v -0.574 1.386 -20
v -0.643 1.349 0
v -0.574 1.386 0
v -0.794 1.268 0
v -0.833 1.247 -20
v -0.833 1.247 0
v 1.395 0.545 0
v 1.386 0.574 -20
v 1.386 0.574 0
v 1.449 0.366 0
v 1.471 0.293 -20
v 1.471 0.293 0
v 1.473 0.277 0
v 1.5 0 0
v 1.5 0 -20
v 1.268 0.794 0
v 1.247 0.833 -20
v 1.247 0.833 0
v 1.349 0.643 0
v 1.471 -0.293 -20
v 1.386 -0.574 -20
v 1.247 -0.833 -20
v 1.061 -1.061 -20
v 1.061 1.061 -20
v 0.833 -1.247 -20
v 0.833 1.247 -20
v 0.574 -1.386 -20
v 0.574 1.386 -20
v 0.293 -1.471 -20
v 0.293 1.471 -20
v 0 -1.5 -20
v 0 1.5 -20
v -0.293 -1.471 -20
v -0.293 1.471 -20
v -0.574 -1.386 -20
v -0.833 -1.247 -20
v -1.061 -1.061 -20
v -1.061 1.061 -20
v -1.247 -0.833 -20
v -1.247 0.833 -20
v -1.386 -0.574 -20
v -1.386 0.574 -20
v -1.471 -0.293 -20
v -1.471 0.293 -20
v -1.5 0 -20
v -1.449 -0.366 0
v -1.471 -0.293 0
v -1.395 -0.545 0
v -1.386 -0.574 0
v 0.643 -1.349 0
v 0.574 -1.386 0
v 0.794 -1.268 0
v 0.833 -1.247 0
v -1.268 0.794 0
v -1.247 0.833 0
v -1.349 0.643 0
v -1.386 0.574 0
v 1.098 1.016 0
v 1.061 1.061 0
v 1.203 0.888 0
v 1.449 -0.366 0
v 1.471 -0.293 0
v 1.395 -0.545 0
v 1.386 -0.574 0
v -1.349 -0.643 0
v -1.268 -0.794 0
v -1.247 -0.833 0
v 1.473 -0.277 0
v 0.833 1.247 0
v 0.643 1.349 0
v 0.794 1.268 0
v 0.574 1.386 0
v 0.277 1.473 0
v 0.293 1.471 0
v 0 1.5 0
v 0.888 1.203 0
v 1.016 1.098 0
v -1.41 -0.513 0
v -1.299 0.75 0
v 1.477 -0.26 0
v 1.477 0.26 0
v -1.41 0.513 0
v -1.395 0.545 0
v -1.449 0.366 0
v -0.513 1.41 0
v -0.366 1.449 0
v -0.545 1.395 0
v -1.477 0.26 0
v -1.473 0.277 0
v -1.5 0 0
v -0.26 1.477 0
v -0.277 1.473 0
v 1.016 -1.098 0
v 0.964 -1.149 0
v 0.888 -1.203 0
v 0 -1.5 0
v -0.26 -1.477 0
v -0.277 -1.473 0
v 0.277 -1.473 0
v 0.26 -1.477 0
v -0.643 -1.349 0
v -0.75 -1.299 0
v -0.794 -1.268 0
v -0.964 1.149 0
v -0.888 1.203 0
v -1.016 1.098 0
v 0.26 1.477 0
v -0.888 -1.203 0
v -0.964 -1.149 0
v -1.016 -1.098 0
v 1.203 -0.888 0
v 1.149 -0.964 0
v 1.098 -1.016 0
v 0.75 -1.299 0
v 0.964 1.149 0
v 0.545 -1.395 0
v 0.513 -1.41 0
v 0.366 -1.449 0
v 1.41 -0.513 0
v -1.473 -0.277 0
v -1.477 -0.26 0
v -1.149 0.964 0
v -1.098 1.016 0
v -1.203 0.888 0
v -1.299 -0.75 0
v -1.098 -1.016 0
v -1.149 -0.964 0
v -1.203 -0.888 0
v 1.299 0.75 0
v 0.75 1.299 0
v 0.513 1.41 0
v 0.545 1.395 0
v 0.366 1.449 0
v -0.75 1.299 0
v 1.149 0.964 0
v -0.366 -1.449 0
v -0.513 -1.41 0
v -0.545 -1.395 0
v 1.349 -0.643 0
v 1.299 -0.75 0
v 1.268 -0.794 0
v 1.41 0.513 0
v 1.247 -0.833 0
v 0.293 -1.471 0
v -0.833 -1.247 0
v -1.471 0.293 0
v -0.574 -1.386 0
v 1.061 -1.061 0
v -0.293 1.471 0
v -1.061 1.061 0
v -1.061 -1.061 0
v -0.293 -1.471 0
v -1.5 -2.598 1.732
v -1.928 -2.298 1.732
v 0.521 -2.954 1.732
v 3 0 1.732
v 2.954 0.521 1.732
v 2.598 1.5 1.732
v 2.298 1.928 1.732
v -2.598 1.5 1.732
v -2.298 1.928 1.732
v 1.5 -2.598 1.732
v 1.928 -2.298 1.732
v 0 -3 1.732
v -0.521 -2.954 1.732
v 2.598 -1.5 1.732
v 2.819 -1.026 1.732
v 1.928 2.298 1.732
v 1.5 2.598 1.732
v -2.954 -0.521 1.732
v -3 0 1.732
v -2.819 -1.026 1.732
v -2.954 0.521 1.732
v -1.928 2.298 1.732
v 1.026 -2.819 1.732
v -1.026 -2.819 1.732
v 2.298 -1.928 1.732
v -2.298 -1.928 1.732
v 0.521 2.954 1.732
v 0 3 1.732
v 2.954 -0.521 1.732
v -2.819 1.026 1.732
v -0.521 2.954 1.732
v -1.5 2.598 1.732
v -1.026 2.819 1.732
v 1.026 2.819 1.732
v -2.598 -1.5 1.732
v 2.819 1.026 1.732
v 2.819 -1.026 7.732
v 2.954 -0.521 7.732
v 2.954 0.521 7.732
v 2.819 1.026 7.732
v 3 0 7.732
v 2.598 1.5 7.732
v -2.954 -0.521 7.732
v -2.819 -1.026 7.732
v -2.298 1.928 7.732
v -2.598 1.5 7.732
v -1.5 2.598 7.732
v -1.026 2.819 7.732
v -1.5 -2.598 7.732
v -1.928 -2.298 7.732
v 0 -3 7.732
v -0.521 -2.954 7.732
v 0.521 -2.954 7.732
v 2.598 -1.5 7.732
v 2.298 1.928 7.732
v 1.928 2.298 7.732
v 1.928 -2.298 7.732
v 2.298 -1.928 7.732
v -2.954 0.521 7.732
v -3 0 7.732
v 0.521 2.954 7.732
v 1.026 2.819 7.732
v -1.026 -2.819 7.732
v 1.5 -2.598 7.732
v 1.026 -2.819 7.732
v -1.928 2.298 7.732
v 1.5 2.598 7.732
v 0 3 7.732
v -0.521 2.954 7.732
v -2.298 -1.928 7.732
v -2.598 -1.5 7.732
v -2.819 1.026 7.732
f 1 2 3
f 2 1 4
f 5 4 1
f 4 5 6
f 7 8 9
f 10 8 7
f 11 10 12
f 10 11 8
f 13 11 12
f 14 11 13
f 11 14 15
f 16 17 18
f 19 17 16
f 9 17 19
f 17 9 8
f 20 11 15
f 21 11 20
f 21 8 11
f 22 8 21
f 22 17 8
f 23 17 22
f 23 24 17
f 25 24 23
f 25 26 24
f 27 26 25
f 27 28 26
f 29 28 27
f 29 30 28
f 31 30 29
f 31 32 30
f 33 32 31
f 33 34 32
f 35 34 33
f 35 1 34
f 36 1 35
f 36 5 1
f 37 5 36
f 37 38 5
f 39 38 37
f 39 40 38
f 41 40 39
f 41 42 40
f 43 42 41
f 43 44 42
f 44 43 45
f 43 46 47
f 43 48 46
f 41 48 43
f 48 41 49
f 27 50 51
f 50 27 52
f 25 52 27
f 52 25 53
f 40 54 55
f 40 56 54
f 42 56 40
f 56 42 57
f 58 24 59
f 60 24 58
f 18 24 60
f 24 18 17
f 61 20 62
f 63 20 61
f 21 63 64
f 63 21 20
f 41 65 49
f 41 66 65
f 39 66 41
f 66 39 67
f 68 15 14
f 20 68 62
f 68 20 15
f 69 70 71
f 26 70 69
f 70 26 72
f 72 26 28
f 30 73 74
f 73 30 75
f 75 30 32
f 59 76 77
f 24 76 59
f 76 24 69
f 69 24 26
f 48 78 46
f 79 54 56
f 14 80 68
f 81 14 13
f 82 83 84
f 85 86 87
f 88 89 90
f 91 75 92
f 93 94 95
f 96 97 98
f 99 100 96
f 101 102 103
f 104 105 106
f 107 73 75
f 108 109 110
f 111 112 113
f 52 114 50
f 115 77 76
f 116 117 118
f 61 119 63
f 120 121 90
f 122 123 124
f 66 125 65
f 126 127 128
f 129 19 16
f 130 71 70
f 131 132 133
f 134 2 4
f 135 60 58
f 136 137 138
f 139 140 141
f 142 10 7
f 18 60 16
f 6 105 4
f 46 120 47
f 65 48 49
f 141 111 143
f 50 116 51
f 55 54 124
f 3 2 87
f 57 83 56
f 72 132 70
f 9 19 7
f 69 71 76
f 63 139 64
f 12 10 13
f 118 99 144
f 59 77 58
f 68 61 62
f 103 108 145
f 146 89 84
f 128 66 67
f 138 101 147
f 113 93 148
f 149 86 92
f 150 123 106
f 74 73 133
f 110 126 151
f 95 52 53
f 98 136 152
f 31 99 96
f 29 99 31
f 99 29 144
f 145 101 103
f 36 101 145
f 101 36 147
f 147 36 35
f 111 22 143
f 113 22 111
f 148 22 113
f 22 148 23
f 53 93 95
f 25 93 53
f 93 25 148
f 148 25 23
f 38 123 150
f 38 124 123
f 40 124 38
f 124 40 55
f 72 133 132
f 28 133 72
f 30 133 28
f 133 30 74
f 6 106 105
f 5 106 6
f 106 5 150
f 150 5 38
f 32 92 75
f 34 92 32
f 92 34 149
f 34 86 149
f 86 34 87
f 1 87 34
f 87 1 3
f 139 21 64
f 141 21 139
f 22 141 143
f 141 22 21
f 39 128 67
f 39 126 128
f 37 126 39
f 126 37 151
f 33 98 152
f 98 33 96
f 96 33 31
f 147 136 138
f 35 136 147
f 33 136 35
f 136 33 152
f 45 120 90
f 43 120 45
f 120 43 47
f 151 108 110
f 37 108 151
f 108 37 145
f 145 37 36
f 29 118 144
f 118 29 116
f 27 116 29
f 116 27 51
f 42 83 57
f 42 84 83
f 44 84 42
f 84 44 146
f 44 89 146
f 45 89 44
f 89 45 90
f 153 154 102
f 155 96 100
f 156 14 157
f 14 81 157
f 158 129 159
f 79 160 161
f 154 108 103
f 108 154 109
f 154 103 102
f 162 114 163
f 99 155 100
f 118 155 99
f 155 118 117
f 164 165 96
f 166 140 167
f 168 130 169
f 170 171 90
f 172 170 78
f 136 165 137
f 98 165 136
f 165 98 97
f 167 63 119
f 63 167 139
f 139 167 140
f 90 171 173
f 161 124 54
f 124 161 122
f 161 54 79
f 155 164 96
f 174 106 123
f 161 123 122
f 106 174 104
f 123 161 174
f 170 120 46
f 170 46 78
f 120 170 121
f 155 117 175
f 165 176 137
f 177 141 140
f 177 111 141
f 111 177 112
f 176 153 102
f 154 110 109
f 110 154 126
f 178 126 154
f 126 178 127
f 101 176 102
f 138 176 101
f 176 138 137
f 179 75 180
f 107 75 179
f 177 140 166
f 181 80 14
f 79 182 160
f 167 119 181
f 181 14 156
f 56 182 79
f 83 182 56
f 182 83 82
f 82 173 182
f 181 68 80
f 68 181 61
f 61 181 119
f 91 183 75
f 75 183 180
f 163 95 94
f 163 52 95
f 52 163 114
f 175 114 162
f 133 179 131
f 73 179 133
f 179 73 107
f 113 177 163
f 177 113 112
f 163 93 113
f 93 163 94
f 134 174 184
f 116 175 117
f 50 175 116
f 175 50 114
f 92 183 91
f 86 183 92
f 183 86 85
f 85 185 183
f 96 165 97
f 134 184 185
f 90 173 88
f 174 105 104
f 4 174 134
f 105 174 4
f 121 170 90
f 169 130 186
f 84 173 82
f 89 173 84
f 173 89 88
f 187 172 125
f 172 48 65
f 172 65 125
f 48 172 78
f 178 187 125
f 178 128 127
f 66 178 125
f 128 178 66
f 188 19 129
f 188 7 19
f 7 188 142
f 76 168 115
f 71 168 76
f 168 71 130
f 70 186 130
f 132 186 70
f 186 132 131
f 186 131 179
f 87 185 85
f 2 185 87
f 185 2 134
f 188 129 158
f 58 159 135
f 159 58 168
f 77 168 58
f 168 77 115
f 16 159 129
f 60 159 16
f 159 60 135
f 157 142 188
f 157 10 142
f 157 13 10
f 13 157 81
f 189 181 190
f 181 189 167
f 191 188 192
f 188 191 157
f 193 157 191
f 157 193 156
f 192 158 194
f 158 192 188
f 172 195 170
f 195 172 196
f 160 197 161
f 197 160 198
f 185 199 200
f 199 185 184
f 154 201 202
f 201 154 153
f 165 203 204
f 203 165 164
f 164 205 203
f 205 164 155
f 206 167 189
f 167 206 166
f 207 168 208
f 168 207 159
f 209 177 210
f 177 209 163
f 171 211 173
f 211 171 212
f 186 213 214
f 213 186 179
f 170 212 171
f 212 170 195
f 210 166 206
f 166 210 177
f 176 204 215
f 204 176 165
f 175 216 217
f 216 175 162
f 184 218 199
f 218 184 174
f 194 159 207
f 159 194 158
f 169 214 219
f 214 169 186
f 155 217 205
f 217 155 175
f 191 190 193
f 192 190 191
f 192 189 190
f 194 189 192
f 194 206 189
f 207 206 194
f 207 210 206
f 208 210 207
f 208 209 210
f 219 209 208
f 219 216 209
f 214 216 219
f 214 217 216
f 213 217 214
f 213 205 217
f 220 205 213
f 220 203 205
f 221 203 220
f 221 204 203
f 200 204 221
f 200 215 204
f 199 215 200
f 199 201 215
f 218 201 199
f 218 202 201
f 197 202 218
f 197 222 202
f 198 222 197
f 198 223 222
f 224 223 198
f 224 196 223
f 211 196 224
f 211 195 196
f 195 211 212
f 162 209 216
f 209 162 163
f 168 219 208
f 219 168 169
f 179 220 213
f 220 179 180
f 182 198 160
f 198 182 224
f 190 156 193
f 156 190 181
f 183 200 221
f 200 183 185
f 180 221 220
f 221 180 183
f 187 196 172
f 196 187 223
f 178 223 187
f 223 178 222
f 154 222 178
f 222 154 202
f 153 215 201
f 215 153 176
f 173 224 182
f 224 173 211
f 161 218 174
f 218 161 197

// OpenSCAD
// file: design.scad
use <utils.scad>;

Pi = 3.141592653589793;
dt = .25;
dTHETA = 3;

A = 1;
A_in = A; //A;
A_out = A; //A;
wall_t = .66;
t = 4;

wx = 57.5; //echo(15 + 35 + 1.5 + 2 + 4);
wy = 69; //battery width 65mm + spacings
//wx = 58; //echo(15 + 35 + 1.5 + 2 + 4);
//wy = 77; //battery width 65mm + spacings

r_corner = wx/10;
H_ = 132; //124; //124; 150; //
ni = floor(H_/ t);
H = t*(ni+1);
sc = 1.;
sc2 = 1.;
mid = .65;
w_rim = 4;     
a = floor(t/dt);
echo("a = ", a);
echo("Height = ", H);


    
// BOTS:
d3bolt = 3;
d3bolt_t = 2.8;

// NEMA
nema_spacing = .3;
nema14_x = 35.2 + nema_spacing;
nema14_y = 35.2 + nema_spacing;
nema14_z = 23.0 + nema_spacing;
corner_cut = 2  + nema_spacing;
nema_L_axle = 17;
nema_r_axle = 5/2  + nema_spacing;
nema_bolt_d = d3bolt;
nema_L_bolt = 5;

middle_cyl_r = 11  + nema_spacing;
middle_cyl_h = 2  + nema_spacing;

// DUE dimensions:
due_width = 53.21;
due_length = 104.47;
due_hole_w = 48.26;
due_d_bolt = d3bolt;


move_up = due_length - 15.24 - 6.68 + 6;
x_hole_due  = due_hole_w/2;
hole_coord_due = [[-x_hole_due, move_up, 0], 
                  [x_hole_due, move_up-1.27, 0],
                  [x_hole_due, move_up-76.43, 0],  
                  [-x_hole_due + 5 + 27.94, move_up-76.43 + 24.13, 0],  
                  [-x_hole_due, move_up-82.55, 0],
                  [-x_hole_due + 5, move_up-82.55 + 30.48, 0]
                  ];
                  
bolt_coord_due = [[-x_hole_due, move_up, 0], 
                  //[x_hole_due, move_up-1.27, 0],
                  //[x_hole_due, move_up-76.43, 0],  
                  [-x_hole_due + 5 + 27.94, move_up-76.43 + 24.13, 0],  
                  [-x_hole_due, move_up-82.55, 0],
                  [-x_hole_due + 5, move_up-82.55 + 30.48, 0]];

// rpi dimensions:
rpi_width = 31;
rpi_length = 69;
rpi_hole_w = 23;
rpi_hole_l = 58;
rpi_d_bolt = 2.8;

x_hole_rpi  = rpi_hole_w/2;
hole_coord_rpi = [[-x_hole_rpi, 0, 0], [x_hole_rpi, 0, 0], [-x_hole_rpi, rpi_hole_l, 0],  [x_hole_rpi, rpi_hole_l, 0]];
bolt_coord_rpi = hole_coord_rpi;


// converter params:
hole_coord_dcdc = [[-35/2, 2.5, 0], [35/2, 19 + 2.5, 0]];
bolt_coord_dcdc = hole_coord_dcdc;
h_dcdc = 25;

// HAND PARAMS:
sc_hand = 1.;
sc2_hand = 1;
wx_hand = 14;
wy_hand = wx_hand;
r_corner_hand = wx_hand/8;
L_hand = 72;
ni_hand = ceil(L_hand/t);
mid_hand = .8;
rot_hand = 0;
//hand_axle_h = H - nema14_x/2 - 26;
//hand_axle_h = t + 3*nema14_x/2 + 27;
hand_axle_h = H - nema14_x/2 - 2*t; 
hand_z = hand_axle_h; // -ni_hand*t;
t_motor_mount = 4;
hand_shift = 6;
hand_y = wy/2 + wy_hand - 2*t_motor_mount;
axle_x = wx/2 - nema14_x/2 - 1.5;
bolt_wall_t = .7;


// Battery Params
bat_x = 55;
bat_y = 27;
bat_z = 30;
backBattSpace = .5;
hBattBag = 10*t;


echo("Top h = ", H - hand_axle_h - nema14_x/2);

// STEPPER CONTROLLERS
x_hole_stepper = wx/2 - r_corner;
stepper_z0 = t + nema14_x + t;
stepper_z1 = hand_axle_h - nema14_x/2 - t;
stepper_h = stepper_z1 - stepper_z0;


//hole_coord_step = [for (i=[-1,1]) for (j=[0,1]) [i*x_hole_stepper, stepper_z0 + j*stepper_h]];
//bolt_coord_step = hole_coord_step;
hole_coord_step = [];
bolt_coord_step = hole_coord_step;

// BATTERY MOUNT
x_hole_battery = 0;
battery_z0 = t + nema14_x - t;
battery_z1 = hand_axle_h - nema14_x/2 + t;
battery_h = battery_z1 - battery_z0;

hole_coord_battery = [for (j=[0,1]) [x_hole_battery, battery_z0 + j*battery_h]];
bolt_coord_battery = hole_coord_battery;



// MPU6050 GYRO
hole_x_mpu = 0;
hole_y_mpu = 8;
hole_coord_mpu = [for (j=[-1,1])[hole_x_mpu, j*hole_y_mpu]];
bolt_coord_mpu = hole_coord_mpu;

// LEG PARAMS
sc_leg = 1;
sc2_leg = 1.;
mid_leg = .6;
wx_leg = 22;
wy_leg = wx_leg;
r_corner_leg = 2;
ni_leg = 6;
wheel_angle = 0;
//leg_y = wy/2*sc + wy_leg - t_motor_mount - t_motor_mount;

// HEAD PARAMS:
spacing = 4; // distance between rpi and walls
wx_head = rpi_width + wall_t*2 + spacing;
wy_head = wx_head;
r_corner_head = wx_head/10;
ni_head = ceil(75/t);
head_x = -14; //-7

sc_head = 1;
sc2_head = 1;
mid_head = .5;
w_rim_head = w_rim;
heights_head = heights(sc_head, sc2_head, mid_head, t, wx_head, ni_head);

/*
// BACKBAG PARAMS:
wx_backbag = bat_y + 4*wall_t; // + w_rim*2; //wx; //rpi_width + wall_t*2 + spacing;
wy_backbag = bat_x + 4*wall_t; // + w_rim*2; // 54 + 25; //wy*1.1;
r_corner_backbag = wx_backbag/10;

ni_backbag = ceil((2*bat_z)/t);
backbag_x = -7;

sc_backbag = 1;
sc2_backbag = 1;
mid_backbag = .5;
w_rim_backbag = w_rim;
heights_backbag = heights(sc_backbag, sc2_backbag, mid_backbag, t, wx_backbag, ni_backbag);
backbag_H = H - ni_backbag*t - 2*t;
*/

// NECK PARAMS
neck_t = 18;
axle_wall_t = 8;
neck_axle_d = 3.15;
r_pivot_circle = neck_axle_d/2 + axle_wall_t;

neck_h = wx_head/2 + A_out + 4;
axle_d_from_wall = 1;
neck_width = 23.5;

neck_pivot_angle_min = -5;
neck_pivot_angle_max = 60;

// COVER PARAMS
thickness_bottom = 2;
bottom_rim_w = 1;
//lid_spacing_scale = .0;
lid_spacing = .3;
switch_d = 5;


// MISC PARAMS
heights_ = heights(sc, sc2, mid, t, wx, ni);
el_mount_h = 3.5;
bolt_sink = 1.2;
// file: wigleUnit.scad
include <utils.scad>;
include <design.scad>;

build = 0;


module wigle_cyl(theta, A_in, A_out, t, wall_t, R, phi0, phi1, cyl, a){
    

    rotate_extrude(angle = phi1 - phi0, $fa = dTHETA, $fs = dt) wigle(theta, A_in, A_out, t, wall_t, R, 0, cyl, a);
    }

module wigle_bar(theta, A_in, A_out, t, wall_t, L, solid, cyl, a){
    translate([0, -9*wall_t, 0]) rotate([90,0,90]) linear_extrude(height = L, $fn = 2)
        
    wigle(theta, A_in, A_out, t, wall_t, 10*wall_t, solid, cyl, a);
}

module wigle(theta, A_in, A_out, t, wall_t, R, solid, cyl, a){
    
    
    // Wigle
    function fx(i,a,A,t, phase) = A*pow(sin(phase + 180*i/a), 2); 
    function fy(i,a,t) = t*i/a;
    
    
    theta_in = solid == 1 ? 0 : theta;
    A_in_ = solid == 1 ? 0 : A_in;
    t_in = solid == 1 ? t*cos(theta) : t;
    
    // SINE CORNER:
    points_in = [for (i=[0:1:a]) [max(0, R + cos(theta_in)*fx(i,a,A_in_,t_in,theta_in/2) + sin(theta_in)*fy(a-i,a,t_in) - wall_t), -sin(theta_in)*fx(i,a,A_in_,t_in,theta_in/2) + cos(theta_in)*fy(a-i,a,t_in)]];
    points_out = [for (i=[0:1:a]) [max(0, R + cos(theta)*fx(i,a,A_out,t, 0) + sin(theta)*fy(i,a,t)), -sin(theta)*fx(i,a,A_out,t,0) + cos(theta)*fy(i,a,t)]];
    points_wigle = concat(points_in, points_out);
    
    
    // SPHERE CORNER:
    function fx_sphere(i,a,t) = t*cos(theta + (90-theta)*i/a) - t*cos(theta); 
    function fy_sphere(i,a,t) = t*sin(theta + (90-theta)*i/a) - t*sin(theta);
    function fy_straight(i,a,t) = i/a*t*(1-sin(theta)); 
    
    points_in_sphere = [for (i=[0:1:a]) [max(0, R - max(wall_t, t*cos(theta))), max(0, fy_straight(i,a,t))]];
    points_out_sphere = [for (i=[a:-1:0]) [max(0, R + fx_sphere(i,a,t)),max(0, fy_sphere(i,a,t))]];
    points_sphere = concat(points_in_sphere, points_out_sphere);
    

    // FULL SPHERE CORNER:
    r = wall_t*cos(theta)/2;
    hy = t - r;
    
    function fx_full_sphere(i,a, t, hy, wall_t, theta) = r*cos(theta + 180*i/a) - hy*sin(theta) + r*cos(-theta); 
    function fy_full_sphere(i,a, t, hy, wall_t, theta) = r*sin(theta + 180*i/a) + hy*cos(-theta);
    
    
    points_full_sphere = [for (i=[0:1:a]) [max(0, R - fx_full_sphere(i,a, t, hy, wall_t, theta)), fy_full_sphere(i,a, t, hy, wall_t, theta)], [R, 0], [R - wall_t, 0]];
    

    // SELECT:    
    points = cyl==0 ? points_wigle : cyl==1 ? points_sphere : cyl==2 ? points_full_sphere : 1;
    
    polygon(points);
    
}


module wigle_wigle_square(wx, wy, r, theta, A_in, A_out, t, wall_t, cyl, a){
      
    
    a1 = r*360/(50*Pi)/t*a;
    echo(a1);
    intersection(){
        wigle_square(wx, wy, r, theta, 0, 0, t, max(wx, wy), 0, a);
        union(){
            for (i=[0:1:max(wx,wy)/t+1]){
                rotate_extrude($fn = a1, $fs = .01) translate([(1+i)*t,0,0]) rotate([0,0,90]) wigle(0, 0, A_out, t, wall_t, wall_t, 0, cyl, a);
            }
        }
    }
}


module wigle_square(wx, wy, r, theta, A_in, A_out, t, wall_t, cyl, a){
    
    module corner(){
        // corner:
        translate([wx/2 - r, wy/2 - r, 0]) wigle_cyl(theta, A_in, A_out, t, wall_t, r, 0, 90, cyl, a);
        
        x_ = wy/2 - wx/2;
        points = [[0, 8*wy], [wy, x_ + wy], [0, wy/2 - wx/2]];
        //sides
        
        wall_t_y = min(wall_t, wy/2);
        solid = wy/2 < wall_t ? 1 : 0;
        intersection(){
            translate([0, wy/2 - wall_t_y, 0]) wigle_bar(theta, A_in, A_out, t, wall_t_y, wx/2 - r, solid, cyl, a);
            linear_extrude(height = t+1) polygon(points);
        }
        
        wall_t_x = min(wall_t, wx/2);
        solid = wx/2 < wall_t ? 1 : 0;
        difference(){
            translate([wx/2 - wall_t_x, 0, 0]) mirror([0,1,0])rotate([0,0,-90]) wigle_bar(theta, A_in, A_out, t, wall_t_x, wy/2 - r, solid, cyl, a);
            linear_extrude(height = t+1) polygon(points);
        }
    }
    
    
    union() {
        corner();
        mirror([1,0,0])corner();
        mirror([0,1,0])corner();
        mirror([1,0,0]) mirror([0,1,0])corner();
    }
}
// main file
use <wigleUnit.scad>;
//include <design.scad>;


dt_utils = .3;
dTHETA_utils = 10;

function get_bolt_sink(boltD, add) = boltD/2 + add;

function add(v, i = 0, r = 0) = i < len(v) ? add(v, i + 1, r + v[i]) : r;

function select(vector,indices) = [ for (index = indices) vector[index] ];


function width_scale(sc,sc2, x, mid) = 1 + x*(pow(mid,3)*sc2 - pow(mid,3) + 3*mid - sc*(3*mid - 2)-2)/(mid*(pow(mid,2) - 2*mid + 1)) + pow(x,3)*(pow(mid,2)*sc2 - pow(mid,2) + 2*mid - sc*(2*mid-1) - 1)/(pow(mid,2)*(pow(mid,2) - 2*mid + 1)) + pow(x,2)*(-2*pow(mid,3)*sc2 + 2*pow(mid,3) -3*pow(mid,2) + sc*(3*pow(mid,2) - 1) + 1)/(pow(mid,2)*(pow(mid,2) - 2*mid + 1));


function theta(sc, sc2, i, ni, mid, t, wx) = asin((width_scale(sc,sc2, (i+1)/ni, mid) - width_scale(sc,sc2, i/ni, mid))*wx/(2*t));


function heights(sc, sc2, mid, t, w, ni) = [for (i=[0:1:ni]) t*cos(theta(sc, sc2, i, ni, mid, t, w))];


// shell:
module shell(wall_t, sc, sc2, mid, t, wx, wy, r_corner, ni, A_in, A_out, a){
    heights_ = heights(sc, sc2, mid, t, wx, ni);
    color("DarkSlateGray") 
    union(){
    for (i=[0:1:ni]){
        wx_ = width_scale(sc,sc2, i/ni, mid)*wx;
        wy_ = width_scale(sc,sc2, i/ni, mid)*wy;
        r_corner_ = width_scale(sc,sc2, i/ni, mid)*r_corner;
        
        theta_ = theta(sc, sc2, i, ni, mid, t, wx);
        h = add(select(heights_, [0:1:i-1]));
        translate([0,0,h]) wigle_square(wx_, wy, r_corner, theta_, A_in, A_out, t, wall_t, 0, a);
    }
    }
}

module bolt(L, r, a){
    h_ = 2*r/sqrt(3);
    r2_ = 2*r;
    a = 40;
    cylinder(r = r, h = L, $fn = a);
    translate([0,0,L])cylinder(r1 = r, r2 = r2_, h = h_, $fs = dt_utils/2, $fa = dTHETA_utils);
    translate([0,0,L+h_])cylinder(r1 = r2_, r2 = r2_, h = r2_, $fs = dt_utils/2, $fa = dTHETA_utils);
    }

module bolt_new(L, r, a){
    h_ = 2*r/sqrt(3);
    r2_ = 2*r;
    h_base = 2*r2_;
    
    translate([0,0,-L])cylinder(r = r, h = L, $fs = dt_utils, $fa = dTHETA_utils);
    cylinder(r1 = r, r2 = r2_, h = h_, $fs = dt_utils, $fa = dTHETA_utils);
    translate([0,0,h_])cylinder(r1 = r2_, r2 = r2_, h = h_base, $fs = dt_utils, $fa = dTHETA_utils);
}
    
    
bolt_new(20, 1.5, 20);
